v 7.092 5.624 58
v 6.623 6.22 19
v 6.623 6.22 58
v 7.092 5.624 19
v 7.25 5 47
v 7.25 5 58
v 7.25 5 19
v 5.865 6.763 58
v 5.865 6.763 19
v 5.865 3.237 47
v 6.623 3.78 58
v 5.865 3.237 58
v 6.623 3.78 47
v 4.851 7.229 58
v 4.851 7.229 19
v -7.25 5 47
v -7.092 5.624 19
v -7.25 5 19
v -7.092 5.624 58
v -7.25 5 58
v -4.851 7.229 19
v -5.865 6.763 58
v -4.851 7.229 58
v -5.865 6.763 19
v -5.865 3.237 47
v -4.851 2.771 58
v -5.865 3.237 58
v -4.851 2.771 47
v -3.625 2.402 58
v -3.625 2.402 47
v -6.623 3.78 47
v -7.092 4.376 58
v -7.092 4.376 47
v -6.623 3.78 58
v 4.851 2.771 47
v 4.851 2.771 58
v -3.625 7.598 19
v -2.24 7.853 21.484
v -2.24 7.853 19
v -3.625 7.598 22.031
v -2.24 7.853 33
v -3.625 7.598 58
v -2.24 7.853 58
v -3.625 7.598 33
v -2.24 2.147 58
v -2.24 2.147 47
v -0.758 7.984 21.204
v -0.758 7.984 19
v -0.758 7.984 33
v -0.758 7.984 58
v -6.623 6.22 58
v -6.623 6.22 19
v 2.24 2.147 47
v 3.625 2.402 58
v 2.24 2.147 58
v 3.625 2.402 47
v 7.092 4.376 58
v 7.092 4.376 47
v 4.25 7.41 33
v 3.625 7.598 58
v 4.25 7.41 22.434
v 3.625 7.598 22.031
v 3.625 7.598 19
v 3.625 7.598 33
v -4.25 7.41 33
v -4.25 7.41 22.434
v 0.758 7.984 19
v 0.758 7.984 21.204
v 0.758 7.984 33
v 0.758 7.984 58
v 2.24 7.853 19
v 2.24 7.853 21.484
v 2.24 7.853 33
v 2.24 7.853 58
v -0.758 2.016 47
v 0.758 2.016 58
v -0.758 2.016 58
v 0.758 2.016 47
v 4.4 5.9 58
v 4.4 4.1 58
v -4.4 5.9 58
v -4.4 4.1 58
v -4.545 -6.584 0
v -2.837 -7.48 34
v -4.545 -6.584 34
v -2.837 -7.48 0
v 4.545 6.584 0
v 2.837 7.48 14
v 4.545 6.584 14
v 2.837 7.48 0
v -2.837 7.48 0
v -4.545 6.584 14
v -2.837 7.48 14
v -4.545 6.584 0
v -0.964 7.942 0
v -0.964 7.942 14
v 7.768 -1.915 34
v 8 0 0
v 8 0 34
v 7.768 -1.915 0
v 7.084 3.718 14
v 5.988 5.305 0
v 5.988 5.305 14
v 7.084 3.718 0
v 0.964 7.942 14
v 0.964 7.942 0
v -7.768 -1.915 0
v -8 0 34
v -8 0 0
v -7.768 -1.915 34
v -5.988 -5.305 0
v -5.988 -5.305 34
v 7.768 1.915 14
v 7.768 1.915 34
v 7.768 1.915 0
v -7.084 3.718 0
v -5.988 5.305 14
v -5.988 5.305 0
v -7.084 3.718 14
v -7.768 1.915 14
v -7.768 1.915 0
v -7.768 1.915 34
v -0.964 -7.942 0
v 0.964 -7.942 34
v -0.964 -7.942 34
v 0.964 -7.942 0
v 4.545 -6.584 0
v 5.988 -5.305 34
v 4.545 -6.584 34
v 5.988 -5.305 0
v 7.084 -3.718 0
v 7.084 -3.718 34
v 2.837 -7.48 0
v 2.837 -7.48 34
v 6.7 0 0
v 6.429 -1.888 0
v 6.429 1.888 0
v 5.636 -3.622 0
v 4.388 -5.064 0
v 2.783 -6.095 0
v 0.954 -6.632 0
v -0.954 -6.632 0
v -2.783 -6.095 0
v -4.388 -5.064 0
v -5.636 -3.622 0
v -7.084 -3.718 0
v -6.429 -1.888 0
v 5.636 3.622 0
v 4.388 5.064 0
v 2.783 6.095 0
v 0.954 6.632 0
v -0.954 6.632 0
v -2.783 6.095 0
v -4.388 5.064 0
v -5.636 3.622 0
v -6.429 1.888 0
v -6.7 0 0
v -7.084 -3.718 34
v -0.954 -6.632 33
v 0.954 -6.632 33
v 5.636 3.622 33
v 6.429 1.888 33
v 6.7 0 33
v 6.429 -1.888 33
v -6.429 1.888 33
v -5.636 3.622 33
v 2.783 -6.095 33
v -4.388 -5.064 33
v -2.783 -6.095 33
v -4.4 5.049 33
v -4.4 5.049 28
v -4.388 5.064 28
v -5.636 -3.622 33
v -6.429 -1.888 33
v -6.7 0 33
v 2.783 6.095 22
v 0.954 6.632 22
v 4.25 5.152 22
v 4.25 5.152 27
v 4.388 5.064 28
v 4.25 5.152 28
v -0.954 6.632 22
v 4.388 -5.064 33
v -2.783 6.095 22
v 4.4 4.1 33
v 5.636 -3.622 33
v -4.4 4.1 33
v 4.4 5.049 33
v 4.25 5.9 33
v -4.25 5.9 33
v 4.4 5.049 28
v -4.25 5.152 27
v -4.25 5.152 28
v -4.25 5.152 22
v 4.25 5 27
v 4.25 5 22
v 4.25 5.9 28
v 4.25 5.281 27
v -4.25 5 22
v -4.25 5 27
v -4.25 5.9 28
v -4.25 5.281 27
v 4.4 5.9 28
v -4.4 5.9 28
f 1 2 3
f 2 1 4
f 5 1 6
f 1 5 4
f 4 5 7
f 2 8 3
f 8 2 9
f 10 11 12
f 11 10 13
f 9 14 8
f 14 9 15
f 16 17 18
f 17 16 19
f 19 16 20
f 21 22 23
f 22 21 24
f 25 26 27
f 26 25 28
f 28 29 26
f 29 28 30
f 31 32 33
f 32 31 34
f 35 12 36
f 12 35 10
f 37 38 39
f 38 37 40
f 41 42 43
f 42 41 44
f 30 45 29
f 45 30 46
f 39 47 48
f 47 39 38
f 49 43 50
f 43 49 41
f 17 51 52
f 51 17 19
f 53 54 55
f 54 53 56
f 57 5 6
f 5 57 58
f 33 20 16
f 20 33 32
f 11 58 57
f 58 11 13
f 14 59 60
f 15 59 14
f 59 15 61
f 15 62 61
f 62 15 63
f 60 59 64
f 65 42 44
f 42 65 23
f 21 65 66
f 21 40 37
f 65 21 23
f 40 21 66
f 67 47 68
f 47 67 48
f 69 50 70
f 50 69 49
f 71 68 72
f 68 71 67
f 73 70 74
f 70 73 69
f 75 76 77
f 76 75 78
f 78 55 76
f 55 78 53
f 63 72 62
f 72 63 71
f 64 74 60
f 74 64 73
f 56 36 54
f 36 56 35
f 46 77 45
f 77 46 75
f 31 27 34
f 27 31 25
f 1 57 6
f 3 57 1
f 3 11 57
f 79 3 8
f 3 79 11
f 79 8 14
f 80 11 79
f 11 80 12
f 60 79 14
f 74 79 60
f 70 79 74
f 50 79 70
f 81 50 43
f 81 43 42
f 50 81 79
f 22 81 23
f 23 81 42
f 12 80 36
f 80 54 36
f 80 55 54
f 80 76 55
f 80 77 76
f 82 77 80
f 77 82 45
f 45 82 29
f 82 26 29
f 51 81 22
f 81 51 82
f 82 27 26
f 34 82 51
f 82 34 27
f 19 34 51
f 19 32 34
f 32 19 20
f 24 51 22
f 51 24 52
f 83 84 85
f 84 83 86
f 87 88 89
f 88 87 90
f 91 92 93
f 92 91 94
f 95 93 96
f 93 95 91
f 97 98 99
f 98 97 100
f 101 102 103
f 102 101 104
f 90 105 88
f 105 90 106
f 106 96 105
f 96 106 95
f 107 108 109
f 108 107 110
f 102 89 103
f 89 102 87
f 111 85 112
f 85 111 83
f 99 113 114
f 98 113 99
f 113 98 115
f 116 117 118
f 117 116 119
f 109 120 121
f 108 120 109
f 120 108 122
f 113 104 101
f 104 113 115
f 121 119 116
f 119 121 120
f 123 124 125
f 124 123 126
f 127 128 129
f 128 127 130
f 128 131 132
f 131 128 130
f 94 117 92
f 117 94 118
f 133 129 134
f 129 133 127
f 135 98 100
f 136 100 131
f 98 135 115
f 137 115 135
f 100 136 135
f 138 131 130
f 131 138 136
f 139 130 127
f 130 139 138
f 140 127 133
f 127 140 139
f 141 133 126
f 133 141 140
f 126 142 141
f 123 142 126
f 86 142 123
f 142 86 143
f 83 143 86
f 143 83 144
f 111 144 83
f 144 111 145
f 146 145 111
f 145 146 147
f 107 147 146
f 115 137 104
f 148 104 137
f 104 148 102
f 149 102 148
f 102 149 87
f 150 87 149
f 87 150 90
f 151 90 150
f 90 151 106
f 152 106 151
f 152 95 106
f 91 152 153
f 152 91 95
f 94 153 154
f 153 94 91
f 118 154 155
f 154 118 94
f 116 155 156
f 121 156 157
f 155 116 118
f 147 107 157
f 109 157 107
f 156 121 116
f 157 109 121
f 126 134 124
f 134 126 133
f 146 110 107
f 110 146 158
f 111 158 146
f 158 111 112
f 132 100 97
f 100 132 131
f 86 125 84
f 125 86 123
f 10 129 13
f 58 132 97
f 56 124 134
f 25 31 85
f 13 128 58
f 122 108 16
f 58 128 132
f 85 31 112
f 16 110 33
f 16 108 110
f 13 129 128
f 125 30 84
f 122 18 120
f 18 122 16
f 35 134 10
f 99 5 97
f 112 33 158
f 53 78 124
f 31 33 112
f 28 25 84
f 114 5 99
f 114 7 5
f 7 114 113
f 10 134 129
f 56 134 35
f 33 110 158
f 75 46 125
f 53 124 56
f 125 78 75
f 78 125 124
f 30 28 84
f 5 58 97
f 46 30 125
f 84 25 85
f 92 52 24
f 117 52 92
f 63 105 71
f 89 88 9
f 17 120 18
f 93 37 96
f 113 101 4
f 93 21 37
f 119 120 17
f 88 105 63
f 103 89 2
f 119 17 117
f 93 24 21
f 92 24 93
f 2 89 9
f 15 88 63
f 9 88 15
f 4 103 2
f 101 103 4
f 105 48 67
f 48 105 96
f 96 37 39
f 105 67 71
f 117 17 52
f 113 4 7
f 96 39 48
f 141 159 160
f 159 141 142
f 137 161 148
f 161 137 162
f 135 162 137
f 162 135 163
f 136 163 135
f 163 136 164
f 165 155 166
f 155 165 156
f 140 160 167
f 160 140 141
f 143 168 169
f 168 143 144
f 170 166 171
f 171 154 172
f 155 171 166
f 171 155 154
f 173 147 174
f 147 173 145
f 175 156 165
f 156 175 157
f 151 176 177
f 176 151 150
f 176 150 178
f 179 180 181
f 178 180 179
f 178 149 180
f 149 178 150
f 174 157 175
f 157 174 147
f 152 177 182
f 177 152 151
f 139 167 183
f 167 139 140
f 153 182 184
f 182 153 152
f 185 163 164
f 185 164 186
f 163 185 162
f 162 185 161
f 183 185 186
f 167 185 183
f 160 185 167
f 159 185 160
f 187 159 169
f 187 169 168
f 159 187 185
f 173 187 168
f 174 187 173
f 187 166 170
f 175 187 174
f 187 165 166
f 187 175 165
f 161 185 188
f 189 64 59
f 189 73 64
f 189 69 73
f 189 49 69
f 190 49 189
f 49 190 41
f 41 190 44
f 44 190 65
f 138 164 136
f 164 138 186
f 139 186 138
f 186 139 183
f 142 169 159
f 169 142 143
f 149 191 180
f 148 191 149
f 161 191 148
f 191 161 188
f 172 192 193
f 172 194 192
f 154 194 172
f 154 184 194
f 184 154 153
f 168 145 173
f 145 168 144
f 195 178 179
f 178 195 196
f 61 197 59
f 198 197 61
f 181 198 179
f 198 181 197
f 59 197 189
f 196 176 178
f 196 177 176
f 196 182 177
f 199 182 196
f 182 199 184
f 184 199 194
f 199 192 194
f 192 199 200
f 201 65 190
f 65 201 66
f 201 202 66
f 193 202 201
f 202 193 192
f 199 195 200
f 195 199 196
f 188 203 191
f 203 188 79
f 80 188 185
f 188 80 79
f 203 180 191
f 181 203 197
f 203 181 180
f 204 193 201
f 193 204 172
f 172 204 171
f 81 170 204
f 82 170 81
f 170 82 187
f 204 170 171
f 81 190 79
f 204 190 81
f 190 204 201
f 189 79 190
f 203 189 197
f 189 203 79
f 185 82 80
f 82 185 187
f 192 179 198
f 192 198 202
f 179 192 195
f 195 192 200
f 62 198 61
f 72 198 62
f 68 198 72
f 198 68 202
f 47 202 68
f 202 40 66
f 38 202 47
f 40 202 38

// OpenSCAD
//The MIT License (MIT)
//
//Copyright (c) 2014 Loïc Fejoz
//
//Permission is hereby granted, free of charge, to any person obtaining a copy of
//this software and associated documentation files (the "Software"), to deal in
//the Software without restriction, including without limitation the rights to
//use, copy, modify, merge, publish, distribute, sublicense, and/or sell copies of
//the Software, and to permit persons to whom the Software is furnished to do so,
//subject to the following conditions:
//
//The above copyright notice and this permission notice shall be included in all
//copies or substantial portions of the Software.
//
//THE SOFTWARE IS PROVIDED "AS IS", WITHOUT WARRANTY OF ANY KIND, EXPRESS OR
//IMPLIED, INCLUDING BUT NOT LIMITED TO THE WARRANTIES OF MERCHANTABILITY, FITNESS
//FOR A PARTICULAR PURPOSE AND NONINFRINGEMENT. IN NO EVENT SHALL THE AUTHORS OR
//COPYRIGHT HOLDERS BE LIABLE FOR ANY CLAIM, DAMAGES OR OTHER LIABILITY, WHETHER
//IN AN ACTION OF CONTRACT, TORT OR OTHERWISE, ARISING FROM, OUT OF OR IN
//CONNECTION WITH THE SOFTWARE OR THE USE OR OTHER DEALINGS IN THE SOFTWARE.

inner_tolerance=0.3; // Tolerance for hole

total_length=58;
big_cylinder_length=19;
big_cylinder_radius=16 / 2;
mouthpiece_height=6;
mouthpiece_width=14.5;
mouthpiece_length=12;
bigger_part_length=33;
step_length=5;
pipe_radius=(12.8 / 2) + inner_tolerance;
mouthpiece_inner_height=1.8;
mouthpiece_inner_width=8.8;
hole_width=8.5;
hole_length=6;
hole_angle=25;

sc = 100;
epsilon=5;
really_long=total_length;
difference() {
	union() {
        // Mouthpiece part
        // PROFILE_B = ellipse... = 
		translate([0, big_cylinder_radius - mouthpiece_height/2, big_cylinder_length])
		  scale([mouthpiece_width/sc,mouthpiece_height/sc,1])
			cylinder(h = total_length-big_cylinder_length, r1 = sc/2, r2 = sc/2, center = false);

       // big cylinder part
		cylinder(h = big_cylinder_length, r1 = big_cylinder_radius, r2 = big_cylinder_radius, center = false);

       // connection to mouthpiece
		hull() {
          // PROFILE_B =
		  translate([0, big_cylinder_radius - mouthpiece_height/2, total_length-mouthpiece_length])
		    scale([mouthpiece_width/sc,mouthpiece_height/sc,1])
		      cylinder(h = 1, r1 = sc/2, r2 = sc/2, center = false);
		  // PROFILE_A =
		  translate([0,0, bigger_part_length])
		    hull() {
		      translate([0, big_cylinder_radius - mouthpiece_height/2, 0])
		        scale([mouthpiece_width/sc,mouthpiece_height/sc,1])
		          cylinder(h = 1, r1 = sc/2, r2 = sc/2, center = false);
		      cylinder(h = 1, r1 = big_cylinder_radius, r2 = big_cylinder_radius, center = false);
		    }
		}
		// connection to big cylinder
		hull() {
		  // PROFILE_A =
		  translate([0, 0, big_cylinder_length])
		    hull() {
		      translate([0, big_cylinder_radius - mouthpiece_height/2, 0])
		        scale([mouthpiece_width/sc,mouthpiece_height/sc,1])
		          cylinder(h = 1, r1 = sc/2, r2 = sc/2, center = false);
		      cylinder(h = 1, r1 = big_cylinder_radius, r2 = big_cylinder_radius, center = false);
		    }
		  translate([0, 0, big_cylinder_length-step_length])
		     cylinder(h = 1, r1 = big_cylinder_radius, r2 = big_cylinder_radius, center = false);
		}
		
		// Middle part
		// scale([1, 1, bigger_part_length - big_cylinder_length]) * PROFILE_A =
		translate([0, 0, big_cylinder_length])
		  hull() {
		    translate([0, big_cylinder_radius - mouthpiece_height/2, 0])
		      scale([mouthpiece_width/sc,mouthpiece_height/sc,1])
		        cylinder(h = bigger_part_length - big_cylinder_length, r1 = sc/2, r2 = sc/2, center = false);
		    cylinder(h = bigger_part_length - big_cylinder_length, r1 = big_cylinder_radius, r2 = big_cylinder_radius, center = false);
		  };
		// BOX_1 =
		translate([0, big_cylinder_radius-mouthpiece_inner_height, bigger_part_length-hole_length])
			cube(size=[hole_width, mouthpiece_inner_height, 2*hole_length], center=true);
	};
    // Now create holes...
	translate([0, 0, -epsilon])
		difference() {
			cylinder(h = bigger_part_length+epsilon, r1 = pipe_radius, r2 = pipe_radius, center = false);
           // minus BOX_1
			translate([-hole_width/2, big_cylinder_radius - mouthpiece_height/2, bigger_part_length-hole_length])
				cube(size=[hole_width, 2*mouthpiece_inner_height, 2*hole_length], center=false);
		};
	translate([0, big_cylinder_radius - mouthpiece_height/2, bigger_part_length+total_length/2-epsilon])
		cube(size=[mouthpiece_inner_width, mouthpiece_inner_height, total_length], center =true);
	translate([0, really_long/2, bigger_part_length-hole_length/2])
		cube(size=[hole_width, really_long, hole_length], center=true);
	translate([0, big_cylinder_radius , bigger_part_length - hole_length + sin(hole_angle)*hole_length/2 ])
		rotate([-90+hole_angle, 0, 0])
			translate([0, really_long/2, 0])
				cube(size=[hole_width, really_long, hole_length], center=true);
}
